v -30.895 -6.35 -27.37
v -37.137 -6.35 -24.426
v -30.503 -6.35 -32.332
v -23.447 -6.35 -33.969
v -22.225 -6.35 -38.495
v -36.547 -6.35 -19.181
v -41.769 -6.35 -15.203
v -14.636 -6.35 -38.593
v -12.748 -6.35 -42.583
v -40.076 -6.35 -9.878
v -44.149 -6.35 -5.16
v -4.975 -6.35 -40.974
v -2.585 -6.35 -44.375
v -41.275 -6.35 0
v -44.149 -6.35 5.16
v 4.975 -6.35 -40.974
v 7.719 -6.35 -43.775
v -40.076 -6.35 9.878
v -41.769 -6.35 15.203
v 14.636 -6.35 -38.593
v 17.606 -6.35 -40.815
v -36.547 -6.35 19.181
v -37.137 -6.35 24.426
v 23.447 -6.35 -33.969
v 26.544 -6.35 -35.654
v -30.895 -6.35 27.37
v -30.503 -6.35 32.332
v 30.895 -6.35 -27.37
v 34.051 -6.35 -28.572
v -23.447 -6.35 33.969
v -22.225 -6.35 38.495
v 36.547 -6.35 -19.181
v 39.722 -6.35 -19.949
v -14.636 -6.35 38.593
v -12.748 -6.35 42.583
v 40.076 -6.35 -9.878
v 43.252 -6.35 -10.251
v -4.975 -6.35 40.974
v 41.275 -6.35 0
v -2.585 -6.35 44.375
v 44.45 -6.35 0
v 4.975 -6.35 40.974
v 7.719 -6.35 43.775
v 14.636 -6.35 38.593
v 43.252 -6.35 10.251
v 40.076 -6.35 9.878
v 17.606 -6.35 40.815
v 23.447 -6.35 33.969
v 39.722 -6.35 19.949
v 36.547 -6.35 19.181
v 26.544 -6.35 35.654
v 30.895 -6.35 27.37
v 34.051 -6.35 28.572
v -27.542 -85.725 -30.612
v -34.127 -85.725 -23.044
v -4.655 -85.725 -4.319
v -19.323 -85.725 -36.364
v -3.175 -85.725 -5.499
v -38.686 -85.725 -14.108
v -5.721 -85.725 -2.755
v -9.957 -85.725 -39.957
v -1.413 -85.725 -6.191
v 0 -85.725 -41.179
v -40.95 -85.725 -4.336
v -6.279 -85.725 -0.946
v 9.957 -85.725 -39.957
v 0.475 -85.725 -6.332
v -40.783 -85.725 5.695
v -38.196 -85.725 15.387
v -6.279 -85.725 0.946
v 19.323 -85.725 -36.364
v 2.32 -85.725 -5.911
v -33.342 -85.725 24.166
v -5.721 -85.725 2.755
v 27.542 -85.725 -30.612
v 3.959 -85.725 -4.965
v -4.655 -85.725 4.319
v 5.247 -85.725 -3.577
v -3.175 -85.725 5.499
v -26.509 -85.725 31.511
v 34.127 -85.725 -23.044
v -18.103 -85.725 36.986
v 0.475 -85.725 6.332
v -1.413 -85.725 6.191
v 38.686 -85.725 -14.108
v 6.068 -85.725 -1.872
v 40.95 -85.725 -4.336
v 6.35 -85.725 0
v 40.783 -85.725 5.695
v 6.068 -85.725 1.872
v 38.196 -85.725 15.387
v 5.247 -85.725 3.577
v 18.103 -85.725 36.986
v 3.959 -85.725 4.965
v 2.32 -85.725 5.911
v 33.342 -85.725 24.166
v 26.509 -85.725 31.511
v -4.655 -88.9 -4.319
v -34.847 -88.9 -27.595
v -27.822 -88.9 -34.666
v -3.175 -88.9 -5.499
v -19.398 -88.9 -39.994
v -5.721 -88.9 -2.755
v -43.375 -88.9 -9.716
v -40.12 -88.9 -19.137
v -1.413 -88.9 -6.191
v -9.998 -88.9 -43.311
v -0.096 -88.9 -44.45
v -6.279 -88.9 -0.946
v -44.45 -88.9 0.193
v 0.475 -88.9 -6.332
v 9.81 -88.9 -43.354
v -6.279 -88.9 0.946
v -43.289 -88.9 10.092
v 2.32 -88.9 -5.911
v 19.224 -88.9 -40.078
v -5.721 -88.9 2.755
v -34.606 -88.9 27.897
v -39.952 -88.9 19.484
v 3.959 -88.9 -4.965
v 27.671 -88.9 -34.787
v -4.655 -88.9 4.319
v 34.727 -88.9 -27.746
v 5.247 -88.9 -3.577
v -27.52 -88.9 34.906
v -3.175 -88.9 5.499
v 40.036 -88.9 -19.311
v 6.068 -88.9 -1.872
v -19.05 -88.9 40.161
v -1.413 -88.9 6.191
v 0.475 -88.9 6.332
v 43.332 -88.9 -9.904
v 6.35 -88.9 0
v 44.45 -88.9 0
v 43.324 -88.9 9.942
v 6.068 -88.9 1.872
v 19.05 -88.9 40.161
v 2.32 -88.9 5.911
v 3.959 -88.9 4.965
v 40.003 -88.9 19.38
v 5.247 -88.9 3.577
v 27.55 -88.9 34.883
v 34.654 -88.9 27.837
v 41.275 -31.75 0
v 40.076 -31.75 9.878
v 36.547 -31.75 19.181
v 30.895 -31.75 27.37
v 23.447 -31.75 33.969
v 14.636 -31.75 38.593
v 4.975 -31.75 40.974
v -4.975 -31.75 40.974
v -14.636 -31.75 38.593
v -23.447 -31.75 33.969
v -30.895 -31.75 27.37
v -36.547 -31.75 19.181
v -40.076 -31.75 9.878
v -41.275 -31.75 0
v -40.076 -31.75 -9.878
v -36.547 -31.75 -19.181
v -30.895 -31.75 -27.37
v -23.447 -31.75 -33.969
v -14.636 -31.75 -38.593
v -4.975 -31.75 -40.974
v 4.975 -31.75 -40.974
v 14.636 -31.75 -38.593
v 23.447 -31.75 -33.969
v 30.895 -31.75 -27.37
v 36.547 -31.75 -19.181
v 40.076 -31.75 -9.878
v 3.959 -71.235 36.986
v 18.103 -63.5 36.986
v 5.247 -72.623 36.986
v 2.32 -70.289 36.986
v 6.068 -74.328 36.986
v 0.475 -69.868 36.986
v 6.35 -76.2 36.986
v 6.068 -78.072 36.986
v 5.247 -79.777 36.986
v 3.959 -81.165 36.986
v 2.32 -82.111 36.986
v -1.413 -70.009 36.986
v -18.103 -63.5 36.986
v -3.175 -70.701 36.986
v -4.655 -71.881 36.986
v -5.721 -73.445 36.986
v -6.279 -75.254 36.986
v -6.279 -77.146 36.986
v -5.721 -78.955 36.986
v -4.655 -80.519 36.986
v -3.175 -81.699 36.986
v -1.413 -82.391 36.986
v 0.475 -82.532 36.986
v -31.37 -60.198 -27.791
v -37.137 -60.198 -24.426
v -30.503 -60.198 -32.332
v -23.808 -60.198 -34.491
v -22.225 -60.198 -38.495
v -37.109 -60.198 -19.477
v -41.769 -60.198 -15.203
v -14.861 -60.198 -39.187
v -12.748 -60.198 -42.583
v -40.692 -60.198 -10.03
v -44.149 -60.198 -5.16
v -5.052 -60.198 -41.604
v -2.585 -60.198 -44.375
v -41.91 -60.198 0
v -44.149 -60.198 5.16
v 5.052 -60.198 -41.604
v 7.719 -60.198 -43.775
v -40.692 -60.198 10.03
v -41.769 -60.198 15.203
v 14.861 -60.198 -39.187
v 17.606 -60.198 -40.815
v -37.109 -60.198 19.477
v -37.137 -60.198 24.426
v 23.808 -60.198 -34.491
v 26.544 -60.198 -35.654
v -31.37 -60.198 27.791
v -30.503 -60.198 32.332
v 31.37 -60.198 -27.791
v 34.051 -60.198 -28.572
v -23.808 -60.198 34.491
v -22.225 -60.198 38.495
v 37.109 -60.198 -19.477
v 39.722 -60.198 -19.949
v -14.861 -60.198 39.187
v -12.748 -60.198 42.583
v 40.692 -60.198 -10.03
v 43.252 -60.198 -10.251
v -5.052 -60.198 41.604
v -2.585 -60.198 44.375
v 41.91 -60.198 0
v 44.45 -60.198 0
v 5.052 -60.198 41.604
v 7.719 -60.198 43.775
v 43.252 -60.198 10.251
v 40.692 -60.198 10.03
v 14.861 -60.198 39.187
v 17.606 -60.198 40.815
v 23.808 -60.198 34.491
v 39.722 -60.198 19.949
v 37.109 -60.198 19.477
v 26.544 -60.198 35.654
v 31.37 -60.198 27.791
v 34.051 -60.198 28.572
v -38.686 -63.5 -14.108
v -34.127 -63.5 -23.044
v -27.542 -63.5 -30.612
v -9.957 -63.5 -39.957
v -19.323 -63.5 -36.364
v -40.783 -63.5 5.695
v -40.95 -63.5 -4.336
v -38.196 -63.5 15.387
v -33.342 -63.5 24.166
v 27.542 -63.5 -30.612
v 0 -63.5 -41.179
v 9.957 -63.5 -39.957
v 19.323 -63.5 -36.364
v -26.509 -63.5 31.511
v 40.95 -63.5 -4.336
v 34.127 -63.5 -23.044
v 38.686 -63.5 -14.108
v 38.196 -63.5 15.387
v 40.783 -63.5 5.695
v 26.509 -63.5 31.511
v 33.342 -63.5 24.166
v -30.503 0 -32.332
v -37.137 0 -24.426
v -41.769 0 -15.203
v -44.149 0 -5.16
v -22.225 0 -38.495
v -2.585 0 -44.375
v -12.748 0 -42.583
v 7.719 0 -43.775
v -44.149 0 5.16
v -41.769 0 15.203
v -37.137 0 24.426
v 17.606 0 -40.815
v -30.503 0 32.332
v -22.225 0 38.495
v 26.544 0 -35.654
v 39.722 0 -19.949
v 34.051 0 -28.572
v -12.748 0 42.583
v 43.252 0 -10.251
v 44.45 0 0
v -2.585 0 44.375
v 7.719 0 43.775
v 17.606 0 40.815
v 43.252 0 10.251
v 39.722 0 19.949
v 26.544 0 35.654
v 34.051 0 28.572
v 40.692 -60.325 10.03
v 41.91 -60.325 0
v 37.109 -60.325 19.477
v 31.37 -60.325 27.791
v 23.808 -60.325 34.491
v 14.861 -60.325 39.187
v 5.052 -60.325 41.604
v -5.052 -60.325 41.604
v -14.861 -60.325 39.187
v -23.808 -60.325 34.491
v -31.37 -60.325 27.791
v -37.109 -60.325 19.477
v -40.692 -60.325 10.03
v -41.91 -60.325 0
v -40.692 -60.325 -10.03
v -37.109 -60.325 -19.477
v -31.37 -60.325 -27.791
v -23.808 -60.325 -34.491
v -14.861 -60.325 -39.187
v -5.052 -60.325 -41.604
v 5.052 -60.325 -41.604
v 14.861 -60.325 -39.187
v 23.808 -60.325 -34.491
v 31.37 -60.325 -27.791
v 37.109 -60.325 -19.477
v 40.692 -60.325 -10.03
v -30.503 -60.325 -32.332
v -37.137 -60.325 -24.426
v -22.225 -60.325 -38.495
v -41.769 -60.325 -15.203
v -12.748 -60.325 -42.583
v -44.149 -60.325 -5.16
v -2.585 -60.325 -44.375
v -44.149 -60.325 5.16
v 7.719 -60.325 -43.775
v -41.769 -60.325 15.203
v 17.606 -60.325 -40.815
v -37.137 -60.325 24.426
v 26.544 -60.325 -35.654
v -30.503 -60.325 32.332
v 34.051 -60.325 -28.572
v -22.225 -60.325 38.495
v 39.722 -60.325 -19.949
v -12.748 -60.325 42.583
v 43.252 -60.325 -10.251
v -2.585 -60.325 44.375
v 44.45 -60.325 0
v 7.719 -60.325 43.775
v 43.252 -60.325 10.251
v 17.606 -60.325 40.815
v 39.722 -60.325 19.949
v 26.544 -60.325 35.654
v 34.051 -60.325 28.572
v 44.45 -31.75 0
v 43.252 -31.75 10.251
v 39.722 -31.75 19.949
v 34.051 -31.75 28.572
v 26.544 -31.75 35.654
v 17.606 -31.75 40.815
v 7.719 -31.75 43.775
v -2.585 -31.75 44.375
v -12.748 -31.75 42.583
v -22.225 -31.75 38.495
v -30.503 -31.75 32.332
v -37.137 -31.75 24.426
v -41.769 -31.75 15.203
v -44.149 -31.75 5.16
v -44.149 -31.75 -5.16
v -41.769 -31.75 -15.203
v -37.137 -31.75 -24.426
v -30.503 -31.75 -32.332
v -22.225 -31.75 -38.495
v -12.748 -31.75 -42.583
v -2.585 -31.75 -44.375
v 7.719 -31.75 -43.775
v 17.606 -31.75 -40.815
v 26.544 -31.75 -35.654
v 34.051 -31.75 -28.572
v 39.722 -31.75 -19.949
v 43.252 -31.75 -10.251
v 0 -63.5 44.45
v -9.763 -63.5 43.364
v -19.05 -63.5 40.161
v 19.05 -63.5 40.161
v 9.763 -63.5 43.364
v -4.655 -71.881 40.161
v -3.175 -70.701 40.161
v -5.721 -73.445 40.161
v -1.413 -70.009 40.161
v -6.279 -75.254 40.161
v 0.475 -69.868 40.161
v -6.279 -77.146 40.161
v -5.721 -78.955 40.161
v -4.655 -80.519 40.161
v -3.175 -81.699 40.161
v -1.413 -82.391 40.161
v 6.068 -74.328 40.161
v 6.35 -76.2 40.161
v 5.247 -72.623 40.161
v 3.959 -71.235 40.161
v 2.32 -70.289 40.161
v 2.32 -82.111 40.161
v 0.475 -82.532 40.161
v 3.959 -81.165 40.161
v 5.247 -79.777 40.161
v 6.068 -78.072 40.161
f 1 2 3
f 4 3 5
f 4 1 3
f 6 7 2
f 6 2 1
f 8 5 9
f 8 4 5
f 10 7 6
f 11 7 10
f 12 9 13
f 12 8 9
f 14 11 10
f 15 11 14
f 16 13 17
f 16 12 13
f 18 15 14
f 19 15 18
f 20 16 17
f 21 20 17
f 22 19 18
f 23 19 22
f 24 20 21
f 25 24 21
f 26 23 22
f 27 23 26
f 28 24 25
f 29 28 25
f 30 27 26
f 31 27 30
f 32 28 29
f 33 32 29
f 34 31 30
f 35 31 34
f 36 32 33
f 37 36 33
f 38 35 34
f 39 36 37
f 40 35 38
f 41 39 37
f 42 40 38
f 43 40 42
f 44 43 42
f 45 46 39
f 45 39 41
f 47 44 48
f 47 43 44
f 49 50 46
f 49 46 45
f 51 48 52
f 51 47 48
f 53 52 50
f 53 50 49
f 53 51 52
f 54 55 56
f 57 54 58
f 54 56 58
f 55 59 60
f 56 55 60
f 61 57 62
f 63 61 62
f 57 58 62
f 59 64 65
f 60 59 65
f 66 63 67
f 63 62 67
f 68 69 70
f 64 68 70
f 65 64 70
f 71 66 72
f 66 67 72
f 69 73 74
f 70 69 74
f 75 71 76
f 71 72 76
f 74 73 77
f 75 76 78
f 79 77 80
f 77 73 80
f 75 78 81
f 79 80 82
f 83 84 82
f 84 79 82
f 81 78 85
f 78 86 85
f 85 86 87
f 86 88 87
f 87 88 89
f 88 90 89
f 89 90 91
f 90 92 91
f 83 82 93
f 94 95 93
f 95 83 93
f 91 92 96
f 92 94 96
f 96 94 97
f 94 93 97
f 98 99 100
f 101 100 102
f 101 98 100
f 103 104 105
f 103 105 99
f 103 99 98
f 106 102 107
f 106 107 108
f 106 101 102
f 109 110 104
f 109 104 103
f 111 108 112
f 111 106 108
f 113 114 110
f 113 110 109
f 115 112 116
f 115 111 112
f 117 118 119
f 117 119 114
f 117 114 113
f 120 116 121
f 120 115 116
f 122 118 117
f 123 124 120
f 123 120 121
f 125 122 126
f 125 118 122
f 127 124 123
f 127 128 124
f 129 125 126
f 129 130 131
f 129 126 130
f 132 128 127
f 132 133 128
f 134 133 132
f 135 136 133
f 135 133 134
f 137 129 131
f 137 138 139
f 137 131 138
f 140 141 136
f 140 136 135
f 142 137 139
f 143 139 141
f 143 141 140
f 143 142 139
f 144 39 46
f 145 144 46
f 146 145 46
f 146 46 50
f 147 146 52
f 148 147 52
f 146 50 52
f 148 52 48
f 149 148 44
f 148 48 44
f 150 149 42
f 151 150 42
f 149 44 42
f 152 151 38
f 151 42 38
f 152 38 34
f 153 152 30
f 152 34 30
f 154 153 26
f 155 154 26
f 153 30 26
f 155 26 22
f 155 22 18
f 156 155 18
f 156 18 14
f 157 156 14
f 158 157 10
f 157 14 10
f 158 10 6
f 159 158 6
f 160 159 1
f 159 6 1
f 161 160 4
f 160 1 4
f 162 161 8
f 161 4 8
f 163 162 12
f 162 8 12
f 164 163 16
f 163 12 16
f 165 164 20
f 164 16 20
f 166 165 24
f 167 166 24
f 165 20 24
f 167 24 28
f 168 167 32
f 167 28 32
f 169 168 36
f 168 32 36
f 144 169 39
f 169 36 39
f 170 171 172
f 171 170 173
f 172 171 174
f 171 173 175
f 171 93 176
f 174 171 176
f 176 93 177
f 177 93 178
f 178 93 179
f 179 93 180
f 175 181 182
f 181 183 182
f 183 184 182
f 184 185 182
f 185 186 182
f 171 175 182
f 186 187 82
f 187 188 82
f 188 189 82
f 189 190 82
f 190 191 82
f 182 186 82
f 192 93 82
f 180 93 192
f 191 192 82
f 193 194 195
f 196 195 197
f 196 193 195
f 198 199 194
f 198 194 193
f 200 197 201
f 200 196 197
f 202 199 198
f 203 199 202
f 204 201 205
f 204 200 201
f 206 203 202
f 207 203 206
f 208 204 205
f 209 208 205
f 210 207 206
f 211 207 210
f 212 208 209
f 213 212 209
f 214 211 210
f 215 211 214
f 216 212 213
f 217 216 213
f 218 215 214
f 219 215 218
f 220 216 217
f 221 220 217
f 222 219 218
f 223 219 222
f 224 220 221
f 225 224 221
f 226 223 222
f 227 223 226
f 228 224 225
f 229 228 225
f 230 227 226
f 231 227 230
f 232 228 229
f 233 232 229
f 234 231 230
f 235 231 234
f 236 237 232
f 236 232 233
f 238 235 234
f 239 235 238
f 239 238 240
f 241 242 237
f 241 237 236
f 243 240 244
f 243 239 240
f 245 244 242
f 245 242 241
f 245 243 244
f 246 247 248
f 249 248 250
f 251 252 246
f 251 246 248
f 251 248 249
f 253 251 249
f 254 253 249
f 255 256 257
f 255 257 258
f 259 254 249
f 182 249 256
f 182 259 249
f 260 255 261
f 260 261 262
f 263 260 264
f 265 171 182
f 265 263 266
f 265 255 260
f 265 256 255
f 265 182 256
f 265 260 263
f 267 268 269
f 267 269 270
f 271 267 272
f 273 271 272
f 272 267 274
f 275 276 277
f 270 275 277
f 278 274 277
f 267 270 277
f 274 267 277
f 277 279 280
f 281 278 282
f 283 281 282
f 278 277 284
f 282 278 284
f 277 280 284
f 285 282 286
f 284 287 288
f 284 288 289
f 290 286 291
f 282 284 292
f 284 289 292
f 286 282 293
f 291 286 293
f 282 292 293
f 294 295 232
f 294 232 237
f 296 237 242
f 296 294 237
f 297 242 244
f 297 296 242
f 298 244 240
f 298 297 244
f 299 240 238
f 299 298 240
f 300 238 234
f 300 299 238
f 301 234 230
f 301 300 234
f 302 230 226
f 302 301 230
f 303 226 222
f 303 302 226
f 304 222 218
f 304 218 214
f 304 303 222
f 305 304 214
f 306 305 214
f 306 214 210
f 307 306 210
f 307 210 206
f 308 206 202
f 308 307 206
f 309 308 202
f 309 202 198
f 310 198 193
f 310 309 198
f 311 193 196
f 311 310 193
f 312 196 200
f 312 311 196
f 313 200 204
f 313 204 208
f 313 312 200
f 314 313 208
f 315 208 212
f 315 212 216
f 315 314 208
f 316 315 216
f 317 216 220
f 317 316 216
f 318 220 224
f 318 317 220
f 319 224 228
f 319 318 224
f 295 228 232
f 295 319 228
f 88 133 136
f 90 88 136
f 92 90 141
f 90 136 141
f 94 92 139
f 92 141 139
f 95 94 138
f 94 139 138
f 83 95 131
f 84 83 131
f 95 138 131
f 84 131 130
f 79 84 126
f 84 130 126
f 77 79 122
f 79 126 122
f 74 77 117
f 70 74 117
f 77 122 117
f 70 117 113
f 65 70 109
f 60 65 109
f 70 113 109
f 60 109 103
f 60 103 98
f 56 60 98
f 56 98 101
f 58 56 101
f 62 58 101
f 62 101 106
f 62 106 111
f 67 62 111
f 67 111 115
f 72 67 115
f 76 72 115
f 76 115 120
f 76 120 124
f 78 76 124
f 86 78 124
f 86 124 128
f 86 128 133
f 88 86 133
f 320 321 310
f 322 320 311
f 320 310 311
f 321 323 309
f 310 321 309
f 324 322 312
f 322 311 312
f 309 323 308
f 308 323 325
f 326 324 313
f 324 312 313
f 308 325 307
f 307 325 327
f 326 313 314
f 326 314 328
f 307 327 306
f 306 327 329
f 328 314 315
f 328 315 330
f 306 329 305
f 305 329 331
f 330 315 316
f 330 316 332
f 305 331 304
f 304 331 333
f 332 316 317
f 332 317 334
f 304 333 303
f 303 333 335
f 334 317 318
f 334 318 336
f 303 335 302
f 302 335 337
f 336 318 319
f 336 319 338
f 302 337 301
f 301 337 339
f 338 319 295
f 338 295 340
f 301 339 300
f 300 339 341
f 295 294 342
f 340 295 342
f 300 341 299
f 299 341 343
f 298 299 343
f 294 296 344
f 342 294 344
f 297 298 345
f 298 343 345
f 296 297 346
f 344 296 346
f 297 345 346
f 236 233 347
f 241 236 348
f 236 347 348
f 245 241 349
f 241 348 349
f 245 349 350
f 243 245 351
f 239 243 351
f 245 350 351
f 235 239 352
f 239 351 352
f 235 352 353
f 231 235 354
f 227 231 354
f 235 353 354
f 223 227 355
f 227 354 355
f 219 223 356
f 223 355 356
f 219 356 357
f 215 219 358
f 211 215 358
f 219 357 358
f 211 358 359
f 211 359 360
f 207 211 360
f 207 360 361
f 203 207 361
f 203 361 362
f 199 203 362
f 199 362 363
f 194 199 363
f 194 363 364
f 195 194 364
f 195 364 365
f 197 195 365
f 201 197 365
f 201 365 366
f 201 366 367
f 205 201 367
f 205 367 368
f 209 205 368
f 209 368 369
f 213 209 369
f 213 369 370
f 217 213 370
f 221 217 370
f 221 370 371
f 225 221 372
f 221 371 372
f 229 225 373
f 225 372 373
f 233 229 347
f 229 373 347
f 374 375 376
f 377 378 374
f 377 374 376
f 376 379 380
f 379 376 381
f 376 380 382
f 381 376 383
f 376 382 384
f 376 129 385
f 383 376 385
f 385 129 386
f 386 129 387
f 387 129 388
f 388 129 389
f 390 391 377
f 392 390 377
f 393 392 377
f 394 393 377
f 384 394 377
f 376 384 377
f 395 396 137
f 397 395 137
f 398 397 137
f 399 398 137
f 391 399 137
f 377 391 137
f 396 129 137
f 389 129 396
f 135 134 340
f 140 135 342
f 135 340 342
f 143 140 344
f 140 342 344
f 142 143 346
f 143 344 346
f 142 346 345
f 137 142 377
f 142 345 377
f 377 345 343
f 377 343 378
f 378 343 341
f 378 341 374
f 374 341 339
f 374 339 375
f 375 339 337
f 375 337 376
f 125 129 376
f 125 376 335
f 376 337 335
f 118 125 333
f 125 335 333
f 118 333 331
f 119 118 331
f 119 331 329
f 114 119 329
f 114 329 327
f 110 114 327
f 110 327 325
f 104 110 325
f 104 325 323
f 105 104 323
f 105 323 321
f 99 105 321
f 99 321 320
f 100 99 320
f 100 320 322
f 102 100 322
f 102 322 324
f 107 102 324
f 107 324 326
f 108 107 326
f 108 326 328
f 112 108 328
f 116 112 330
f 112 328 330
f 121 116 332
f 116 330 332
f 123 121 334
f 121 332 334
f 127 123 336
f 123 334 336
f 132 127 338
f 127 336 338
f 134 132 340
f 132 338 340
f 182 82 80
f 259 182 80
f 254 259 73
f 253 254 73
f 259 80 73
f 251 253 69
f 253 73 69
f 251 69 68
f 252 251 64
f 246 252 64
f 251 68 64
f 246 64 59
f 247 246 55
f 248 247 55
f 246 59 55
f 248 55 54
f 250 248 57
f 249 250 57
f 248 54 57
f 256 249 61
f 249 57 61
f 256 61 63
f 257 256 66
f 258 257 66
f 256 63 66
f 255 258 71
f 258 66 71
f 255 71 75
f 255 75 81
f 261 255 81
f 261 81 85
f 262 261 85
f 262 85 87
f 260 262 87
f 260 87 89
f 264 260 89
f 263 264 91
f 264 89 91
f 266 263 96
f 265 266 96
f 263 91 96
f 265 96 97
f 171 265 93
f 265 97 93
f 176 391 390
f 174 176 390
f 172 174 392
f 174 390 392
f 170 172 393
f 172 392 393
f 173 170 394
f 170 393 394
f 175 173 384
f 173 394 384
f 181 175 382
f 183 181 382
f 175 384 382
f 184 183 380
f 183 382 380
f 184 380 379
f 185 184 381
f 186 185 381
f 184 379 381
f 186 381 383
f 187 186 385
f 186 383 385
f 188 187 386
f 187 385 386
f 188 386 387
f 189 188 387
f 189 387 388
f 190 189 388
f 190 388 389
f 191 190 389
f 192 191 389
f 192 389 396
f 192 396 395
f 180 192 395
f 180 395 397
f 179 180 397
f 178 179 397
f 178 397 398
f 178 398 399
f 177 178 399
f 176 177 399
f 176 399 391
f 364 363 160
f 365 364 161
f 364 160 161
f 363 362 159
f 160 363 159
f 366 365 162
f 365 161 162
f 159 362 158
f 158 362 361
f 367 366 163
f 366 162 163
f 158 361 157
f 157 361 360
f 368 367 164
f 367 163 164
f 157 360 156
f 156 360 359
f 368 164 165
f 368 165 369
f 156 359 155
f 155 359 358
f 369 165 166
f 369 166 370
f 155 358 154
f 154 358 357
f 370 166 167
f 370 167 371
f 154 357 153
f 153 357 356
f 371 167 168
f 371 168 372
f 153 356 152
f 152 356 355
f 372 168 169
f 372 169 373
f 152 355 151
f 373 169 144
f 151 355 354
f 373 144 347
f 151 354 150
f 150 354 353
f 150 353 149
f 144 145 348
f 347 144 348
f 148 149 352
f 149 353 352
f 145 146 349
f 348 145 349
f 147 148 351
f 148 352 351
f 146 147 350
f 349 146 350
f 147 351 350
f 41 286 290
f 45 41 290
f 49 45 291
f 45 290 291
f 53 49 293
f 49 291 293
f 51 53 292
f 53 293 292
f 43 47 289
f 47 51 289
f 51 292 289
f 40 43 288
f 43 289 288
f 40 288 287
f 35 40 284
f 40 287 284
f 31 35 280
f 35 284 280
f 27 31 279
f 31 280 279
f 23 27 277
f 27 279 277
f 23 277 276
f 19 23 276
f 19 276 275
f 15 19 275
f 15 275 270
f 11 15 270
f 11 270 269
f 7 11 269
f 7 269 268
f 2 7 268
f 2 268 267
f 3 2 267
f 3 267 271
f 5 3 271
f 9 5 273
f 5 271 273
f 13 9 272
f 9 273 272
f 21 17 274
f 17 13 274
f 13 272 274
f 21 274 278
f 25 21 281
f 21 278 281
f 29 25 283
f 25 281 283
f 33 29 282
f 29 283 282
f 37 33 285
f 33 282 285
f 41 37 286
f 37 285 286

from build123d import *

# Parameters (mm, degrees)
F0_R      = 44.45
F1_DEPTH  = 88.9
F2_R      = 6.35
F3_DEPTH  = 25.4
F5_DEPTH  = 25.4
F6_R      = 6.35
F7_DEPTH  = 25.4
F10_DEPTH = 22.225
F12_R     = 44.45
F12_R_2   = 41.91
F13_DEPTH = 0.127
F15_R     = 48.4692120424
F15_R_2   = 41.275
F16_DEPTH = 25.4


with BuildPart() as f1:
    # F0 (on Front) → F1 (new body)
    with BuildSketch(Plane.XZ):
        Circle(F0_R)
    extrude(amount=F1_DEPTH)

    # F2 (on face) → F3 (cut)
    with BuildSketch(Plane.XZ.offset(88.9)):
        Circle(F2_R)
    extrude(amount=-F3_DEPTH, mode=Mode.SUBTRACT)

    # F4 (on face) → F5 (cut)
    with BuildSketch(Plane.XZ.offset(88.9)):
        with BuildLine():
            ThreePointArc((19.05, 40.1609262841), (0, 44.45), (-19.05, 40.1609262841))
            Line((-19.05, 40.1609262841), (19.05, 40.1609262841))
        make_face()
    extrude(amount=-F5_DEPTH, mode=Mode.SUBTRACT)

    # F6 (on face) → F7 (cut)
    with BuildSketch(Plane.XY.offset(40.1609262841)):
        with Locations((0, -76.2)):
            Circle(F6_R)
    extrude(amount=-F7_DEPTH, mode=Mode.SUBTRACT)

    # F9 (on offset) → F10 (cut)
    with BuildSketch(Plane.XZ.offset(85.725)):
        with BuildLine():
            Line((18.1031520743, 36.9859262841), (-18.1031520743, 36.9859262841))
            ThreePointArc((-18.1031520743, 36.9859262841), (0, -41.1786699411), (18.1031520743, 36.9859262841))
        make_face()
    extrude(amount=-F10_DEPTH, mode=Mode.SUBTRACT)

    # F12 (on offset) → F13 (cut)
    with BuildSketch(Plane.XZ.offset(60.325)):
        Circle(F12_R)
        Circle(F12_R_2, mode=Mode.SUBTRACT)
    extrude(amount=-F13_DEPTH, mode=Mode.SUBTRACT)

    # F15 (on offset) → F16 (cut)
    with BuildSketch(Plane.XZ.offset(6.35)):
        Circle(F15_R)
        Circle(F15_R_2, mode=Mode.SUBTRACT)
    extrude(amount=F16_DEPTH, mode=Mode.SUBTRACT)


solid = f1.part
